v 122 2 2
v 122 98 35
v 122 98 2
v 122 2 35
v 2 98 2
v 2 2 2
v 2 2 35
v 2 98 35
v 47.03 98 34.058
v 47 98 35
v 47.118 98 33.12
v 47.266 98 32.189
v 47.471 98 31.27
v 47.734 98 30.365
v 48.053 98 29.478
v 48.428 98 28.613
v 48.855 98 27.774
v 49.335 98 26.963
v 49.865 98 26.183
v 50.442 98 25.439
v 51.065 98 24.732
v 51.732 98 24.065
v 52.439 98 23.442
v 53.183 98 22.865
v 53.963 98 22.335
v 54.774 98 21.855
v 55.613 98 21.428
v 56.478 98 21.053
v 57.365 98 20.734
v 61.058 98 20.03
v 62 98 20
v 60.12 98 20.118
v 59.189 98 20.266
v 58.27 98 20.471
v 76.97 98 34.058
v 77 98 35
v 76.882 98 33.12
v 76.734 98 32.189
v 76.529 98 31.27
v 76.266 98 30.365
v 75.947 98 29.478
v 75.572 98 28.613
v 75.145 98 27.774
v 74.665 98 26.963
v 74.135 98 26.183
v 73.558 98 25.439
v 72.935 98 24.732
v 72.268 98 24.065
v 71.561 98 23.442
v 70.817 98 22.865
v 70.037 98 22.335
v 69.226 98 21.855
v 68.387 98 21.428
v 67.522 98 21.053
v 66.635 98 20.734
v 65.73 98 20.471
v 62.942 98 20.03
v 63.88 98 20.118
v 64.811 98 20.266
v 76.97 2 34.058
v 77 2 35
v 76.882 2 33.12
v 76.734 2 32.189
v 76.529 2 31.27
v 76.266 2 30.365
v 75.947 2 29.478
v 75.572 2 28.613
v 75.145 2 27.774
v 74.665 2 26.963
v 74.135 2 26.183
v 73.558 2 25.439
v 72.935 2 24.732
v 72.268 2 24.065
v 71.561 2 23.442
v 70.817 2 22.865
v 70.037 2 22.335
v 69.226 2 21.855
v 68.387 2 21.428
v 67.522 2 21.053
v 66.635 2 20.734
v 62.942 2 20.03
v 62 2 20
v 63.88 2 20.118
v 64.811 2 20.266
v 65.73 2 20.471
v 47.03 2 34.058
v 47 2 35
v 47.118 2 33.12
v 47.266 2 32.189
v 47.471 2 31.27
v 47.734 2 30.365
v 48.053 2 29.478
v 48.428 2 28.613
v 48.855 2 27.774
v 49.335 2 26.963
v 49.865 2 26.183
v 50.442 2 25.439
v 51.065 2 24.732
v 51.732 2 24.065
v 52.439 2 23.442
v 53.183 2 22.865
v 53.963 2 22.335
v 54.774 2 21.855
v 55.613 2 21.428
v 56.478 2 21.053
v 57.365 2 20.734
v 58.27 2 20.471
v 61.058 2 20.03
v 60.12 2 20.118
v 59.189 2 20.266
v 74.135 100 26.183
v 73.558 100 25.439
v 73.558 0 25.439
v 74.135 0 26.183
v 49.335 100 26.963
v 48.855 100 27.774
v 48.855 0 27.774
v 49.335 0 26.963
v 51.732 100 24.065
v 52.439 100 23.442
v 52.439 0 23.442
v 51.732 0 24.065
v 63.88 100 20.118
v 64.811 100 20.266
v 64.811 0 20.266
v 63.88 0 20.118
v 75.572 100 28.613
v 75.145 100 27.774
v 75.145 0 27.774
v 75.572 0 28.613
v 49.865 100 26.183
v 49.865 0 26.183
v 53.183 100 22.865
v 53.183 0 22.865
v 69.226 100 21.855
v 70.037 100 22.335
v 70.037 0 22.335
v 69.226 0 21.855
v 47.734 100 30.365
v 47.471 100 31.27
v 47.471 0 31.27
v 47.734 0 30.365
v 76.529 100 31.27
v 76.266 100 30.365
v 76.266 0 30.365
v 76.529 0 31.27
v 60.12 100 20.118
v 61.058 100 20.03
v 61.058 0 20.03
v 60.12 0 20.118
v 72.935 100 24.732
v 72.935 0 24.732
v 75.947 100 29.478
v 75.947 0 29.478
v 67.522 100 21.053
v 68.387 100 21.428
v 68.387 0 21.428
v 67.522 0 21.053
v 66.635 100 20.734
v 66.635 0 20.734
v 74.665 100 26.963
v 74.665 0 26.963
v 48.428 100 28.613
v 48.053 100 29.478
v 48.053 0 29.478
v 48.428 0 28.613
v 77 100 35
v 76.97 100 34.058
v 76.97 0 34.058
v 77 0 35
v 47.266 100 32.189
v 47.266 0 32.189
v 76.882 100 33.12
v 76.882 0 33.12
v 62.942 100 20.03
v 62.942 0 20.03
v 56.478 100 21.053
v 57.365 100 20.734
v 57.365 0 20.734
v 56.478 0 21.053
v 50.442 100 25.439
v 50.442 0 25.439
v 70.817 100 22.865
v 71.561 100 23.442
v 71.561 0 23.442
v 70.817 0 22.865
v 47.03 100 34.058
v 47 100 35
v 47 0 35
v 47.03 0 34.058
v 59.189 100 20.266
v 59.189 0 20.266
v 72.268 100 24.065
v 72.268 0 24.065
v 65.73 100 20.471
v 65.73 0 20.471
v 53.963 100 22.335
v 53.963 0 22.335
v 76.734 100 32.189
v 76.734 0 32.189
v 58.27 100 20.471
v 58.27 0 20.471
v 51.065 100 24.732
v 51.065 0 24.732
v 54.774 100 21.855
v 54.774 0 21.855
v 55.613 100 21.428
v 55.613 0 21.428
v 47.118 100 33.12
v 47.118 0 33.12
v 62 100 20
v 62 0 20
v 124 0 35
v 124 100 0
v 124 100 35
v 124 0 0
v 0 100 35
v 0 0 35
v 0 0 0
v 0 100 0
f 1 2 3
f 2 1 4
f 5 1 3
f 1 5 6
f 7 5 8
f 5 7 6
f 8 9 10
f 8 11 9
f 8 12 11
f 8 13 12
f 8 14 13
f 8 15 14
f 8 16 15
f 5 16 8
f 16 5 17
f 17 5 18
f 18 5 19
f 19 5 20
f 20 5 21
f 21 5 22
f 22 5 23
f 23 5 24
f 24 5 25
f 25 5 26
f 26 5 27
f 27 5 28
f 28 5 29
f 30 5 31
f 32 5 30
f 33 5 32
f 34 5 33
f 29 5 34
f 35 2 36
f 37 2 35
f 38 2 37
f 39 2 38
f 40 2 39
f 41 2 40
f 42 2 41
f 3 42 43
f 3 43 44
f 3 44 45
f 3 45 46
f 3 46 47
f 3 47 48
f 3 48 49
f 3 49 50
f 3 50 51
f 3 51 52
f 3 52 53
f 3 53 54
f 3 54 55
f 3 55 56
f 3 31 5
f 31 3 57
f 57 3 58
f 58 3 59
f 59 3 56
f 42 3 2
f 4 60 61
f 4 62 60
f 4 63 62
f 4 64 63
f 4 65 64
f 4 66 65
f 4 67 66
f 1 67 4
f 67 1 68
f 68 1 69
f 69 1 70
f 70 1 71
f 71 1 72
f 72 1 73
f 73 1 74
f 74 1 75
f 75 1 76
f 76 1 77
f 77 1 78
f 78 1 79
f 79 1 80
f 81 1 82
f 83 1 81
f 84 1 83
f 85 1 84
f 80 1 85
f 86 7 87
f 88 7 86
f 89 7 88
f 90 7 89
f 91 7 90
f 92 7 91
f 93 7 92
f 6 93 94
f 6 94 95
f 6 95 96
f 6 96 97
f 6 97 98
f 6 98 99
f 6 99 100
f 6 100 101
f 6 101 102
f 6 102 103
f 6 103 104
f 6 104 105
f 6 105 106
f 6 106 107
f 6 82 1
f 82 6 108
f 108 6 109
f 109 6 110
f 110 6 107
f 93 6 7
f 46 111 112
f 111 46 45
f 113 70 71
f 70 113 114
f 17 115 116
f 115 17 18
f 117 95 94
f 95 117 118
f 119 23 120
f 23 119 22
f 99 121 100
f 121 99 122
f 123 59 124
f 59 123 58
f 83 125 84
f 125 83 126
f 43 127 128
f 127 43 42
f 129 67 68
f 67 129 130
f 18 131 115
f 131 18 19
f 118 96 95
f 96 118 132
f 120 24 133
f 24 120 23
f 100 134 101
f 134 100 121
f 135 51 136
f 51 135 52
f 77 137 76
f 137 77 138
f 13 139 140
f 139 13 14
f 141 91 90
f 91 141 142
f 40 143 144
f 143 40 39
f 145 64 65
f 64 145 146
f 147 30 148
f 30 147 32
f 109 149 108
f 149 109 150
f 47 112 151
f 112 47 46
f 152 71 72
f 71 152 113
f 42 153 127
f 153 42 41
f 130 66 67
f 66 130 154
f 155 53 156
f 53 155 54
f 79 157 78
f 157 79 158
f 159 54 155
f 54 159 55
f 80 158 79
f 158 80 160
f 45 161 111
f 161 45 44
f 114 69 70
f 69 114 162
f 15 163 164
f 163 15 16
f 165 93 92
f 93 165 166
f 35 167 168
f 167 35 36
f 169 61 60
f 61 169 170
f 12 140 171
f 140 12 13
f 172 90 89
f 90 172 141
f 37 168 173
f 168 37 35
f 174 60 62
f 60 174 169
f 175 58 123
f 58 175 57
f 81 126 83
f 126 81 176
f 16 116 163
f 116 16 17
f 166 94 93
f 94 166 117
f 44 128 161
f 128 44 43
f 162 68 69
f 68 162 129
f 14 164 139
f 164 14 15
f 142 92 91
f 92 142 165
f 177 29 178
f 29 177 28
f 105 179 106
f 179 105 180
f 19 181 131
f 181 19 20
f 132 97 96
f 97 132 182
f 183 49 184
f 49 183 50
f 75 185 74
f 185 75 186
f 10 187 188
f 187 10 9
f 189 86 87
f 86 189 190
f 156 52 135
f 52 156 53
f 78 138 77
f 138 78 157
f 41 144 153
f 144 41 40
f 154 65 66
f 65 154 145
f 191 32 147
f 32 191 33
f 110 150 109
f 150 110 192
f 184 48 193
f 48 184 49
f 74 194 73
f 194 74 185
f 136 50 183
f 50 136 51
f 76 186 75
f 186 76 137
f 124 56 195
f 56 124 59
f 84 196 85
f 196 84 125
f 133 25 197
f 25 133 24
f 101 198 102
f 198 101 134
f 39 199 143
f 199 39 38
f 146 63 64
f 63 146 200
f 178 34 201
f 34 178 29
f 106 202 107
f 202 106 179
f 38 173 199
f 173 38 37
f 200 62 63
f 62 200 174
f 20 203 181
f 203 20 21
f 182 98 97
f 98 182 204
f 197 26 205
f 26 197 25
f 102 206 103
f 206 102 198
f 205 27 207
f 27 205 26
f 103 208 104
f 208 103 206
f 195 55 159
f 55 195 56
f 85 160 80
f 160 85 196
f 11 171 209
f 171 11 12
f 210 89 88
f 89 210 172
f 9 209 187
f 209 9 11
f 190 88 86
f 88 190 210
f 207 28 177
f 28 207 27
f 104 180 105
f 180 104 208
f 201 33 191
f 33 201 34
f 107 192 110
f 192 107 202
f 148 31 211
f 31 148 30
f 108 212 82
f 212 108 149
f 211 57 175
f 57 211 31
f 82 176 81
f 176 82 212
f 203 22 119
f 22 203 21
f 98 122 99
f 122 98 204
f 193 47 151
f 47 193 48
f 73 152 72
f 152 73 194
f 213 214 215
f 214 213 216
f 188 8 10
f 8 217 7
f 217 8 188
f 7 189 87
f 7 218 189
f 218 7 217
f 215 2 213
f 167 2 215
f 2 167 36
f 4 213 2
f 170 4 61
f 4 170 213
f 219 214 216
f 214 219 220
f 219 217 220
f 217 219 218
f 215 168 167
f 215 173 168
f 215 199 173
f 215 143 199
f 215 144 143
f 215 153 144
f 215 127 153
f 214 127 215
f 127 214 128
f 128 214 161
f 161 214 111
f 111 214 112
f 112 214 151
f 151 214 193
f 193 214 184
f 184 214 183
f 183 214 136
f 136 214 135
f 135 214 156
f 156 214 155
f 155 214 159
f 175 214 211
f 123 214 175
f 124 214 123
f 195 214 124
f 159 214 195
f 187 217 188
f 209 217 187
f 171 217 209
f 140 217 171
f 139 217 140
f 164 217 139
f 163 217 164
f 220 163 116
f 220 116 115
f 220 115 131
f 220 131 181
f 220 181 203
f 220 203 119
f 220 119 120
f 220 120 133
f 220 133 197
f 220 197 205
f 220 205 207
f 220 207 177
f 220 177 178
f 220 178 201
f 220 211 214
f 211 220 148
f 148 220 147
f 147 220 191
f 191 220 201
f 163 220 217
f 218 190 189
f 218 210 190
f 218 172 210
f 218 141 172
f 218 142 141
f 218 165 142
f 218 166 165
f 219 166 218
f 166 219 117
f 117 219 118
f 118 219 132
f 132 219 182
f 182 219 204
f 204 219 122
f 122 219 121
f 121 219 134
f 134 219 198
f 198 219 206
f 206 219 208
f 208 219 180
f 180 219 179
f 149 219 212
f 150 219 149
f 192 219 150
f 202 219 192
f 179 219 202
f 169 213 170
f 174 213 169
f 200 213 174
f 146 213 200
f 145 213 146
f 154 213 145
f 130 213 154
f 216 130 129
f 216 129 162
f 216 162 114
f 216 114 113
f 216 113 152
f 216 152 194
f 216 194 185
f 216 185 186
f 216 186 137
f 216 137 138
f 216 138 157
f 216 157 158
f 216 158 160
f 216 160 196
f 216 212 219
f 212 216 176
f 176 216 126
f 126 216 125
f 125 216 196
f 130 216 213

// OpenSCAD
difference(){
	union(){ 

        translate([0,0,0]){
           cube([58+58+8,100,35], center=false);
        }
        

	}
	union() {
        translate([2,2,2]){
           cube([58+58+4,96,99], center=false);
        }
        translate([(58+58+8)/2,150,35]){
            rotate(a = [90,0,0]) {
                cylinder(h=200, r=15, $fn=100, center=false);
            }
        }        

	}
}
